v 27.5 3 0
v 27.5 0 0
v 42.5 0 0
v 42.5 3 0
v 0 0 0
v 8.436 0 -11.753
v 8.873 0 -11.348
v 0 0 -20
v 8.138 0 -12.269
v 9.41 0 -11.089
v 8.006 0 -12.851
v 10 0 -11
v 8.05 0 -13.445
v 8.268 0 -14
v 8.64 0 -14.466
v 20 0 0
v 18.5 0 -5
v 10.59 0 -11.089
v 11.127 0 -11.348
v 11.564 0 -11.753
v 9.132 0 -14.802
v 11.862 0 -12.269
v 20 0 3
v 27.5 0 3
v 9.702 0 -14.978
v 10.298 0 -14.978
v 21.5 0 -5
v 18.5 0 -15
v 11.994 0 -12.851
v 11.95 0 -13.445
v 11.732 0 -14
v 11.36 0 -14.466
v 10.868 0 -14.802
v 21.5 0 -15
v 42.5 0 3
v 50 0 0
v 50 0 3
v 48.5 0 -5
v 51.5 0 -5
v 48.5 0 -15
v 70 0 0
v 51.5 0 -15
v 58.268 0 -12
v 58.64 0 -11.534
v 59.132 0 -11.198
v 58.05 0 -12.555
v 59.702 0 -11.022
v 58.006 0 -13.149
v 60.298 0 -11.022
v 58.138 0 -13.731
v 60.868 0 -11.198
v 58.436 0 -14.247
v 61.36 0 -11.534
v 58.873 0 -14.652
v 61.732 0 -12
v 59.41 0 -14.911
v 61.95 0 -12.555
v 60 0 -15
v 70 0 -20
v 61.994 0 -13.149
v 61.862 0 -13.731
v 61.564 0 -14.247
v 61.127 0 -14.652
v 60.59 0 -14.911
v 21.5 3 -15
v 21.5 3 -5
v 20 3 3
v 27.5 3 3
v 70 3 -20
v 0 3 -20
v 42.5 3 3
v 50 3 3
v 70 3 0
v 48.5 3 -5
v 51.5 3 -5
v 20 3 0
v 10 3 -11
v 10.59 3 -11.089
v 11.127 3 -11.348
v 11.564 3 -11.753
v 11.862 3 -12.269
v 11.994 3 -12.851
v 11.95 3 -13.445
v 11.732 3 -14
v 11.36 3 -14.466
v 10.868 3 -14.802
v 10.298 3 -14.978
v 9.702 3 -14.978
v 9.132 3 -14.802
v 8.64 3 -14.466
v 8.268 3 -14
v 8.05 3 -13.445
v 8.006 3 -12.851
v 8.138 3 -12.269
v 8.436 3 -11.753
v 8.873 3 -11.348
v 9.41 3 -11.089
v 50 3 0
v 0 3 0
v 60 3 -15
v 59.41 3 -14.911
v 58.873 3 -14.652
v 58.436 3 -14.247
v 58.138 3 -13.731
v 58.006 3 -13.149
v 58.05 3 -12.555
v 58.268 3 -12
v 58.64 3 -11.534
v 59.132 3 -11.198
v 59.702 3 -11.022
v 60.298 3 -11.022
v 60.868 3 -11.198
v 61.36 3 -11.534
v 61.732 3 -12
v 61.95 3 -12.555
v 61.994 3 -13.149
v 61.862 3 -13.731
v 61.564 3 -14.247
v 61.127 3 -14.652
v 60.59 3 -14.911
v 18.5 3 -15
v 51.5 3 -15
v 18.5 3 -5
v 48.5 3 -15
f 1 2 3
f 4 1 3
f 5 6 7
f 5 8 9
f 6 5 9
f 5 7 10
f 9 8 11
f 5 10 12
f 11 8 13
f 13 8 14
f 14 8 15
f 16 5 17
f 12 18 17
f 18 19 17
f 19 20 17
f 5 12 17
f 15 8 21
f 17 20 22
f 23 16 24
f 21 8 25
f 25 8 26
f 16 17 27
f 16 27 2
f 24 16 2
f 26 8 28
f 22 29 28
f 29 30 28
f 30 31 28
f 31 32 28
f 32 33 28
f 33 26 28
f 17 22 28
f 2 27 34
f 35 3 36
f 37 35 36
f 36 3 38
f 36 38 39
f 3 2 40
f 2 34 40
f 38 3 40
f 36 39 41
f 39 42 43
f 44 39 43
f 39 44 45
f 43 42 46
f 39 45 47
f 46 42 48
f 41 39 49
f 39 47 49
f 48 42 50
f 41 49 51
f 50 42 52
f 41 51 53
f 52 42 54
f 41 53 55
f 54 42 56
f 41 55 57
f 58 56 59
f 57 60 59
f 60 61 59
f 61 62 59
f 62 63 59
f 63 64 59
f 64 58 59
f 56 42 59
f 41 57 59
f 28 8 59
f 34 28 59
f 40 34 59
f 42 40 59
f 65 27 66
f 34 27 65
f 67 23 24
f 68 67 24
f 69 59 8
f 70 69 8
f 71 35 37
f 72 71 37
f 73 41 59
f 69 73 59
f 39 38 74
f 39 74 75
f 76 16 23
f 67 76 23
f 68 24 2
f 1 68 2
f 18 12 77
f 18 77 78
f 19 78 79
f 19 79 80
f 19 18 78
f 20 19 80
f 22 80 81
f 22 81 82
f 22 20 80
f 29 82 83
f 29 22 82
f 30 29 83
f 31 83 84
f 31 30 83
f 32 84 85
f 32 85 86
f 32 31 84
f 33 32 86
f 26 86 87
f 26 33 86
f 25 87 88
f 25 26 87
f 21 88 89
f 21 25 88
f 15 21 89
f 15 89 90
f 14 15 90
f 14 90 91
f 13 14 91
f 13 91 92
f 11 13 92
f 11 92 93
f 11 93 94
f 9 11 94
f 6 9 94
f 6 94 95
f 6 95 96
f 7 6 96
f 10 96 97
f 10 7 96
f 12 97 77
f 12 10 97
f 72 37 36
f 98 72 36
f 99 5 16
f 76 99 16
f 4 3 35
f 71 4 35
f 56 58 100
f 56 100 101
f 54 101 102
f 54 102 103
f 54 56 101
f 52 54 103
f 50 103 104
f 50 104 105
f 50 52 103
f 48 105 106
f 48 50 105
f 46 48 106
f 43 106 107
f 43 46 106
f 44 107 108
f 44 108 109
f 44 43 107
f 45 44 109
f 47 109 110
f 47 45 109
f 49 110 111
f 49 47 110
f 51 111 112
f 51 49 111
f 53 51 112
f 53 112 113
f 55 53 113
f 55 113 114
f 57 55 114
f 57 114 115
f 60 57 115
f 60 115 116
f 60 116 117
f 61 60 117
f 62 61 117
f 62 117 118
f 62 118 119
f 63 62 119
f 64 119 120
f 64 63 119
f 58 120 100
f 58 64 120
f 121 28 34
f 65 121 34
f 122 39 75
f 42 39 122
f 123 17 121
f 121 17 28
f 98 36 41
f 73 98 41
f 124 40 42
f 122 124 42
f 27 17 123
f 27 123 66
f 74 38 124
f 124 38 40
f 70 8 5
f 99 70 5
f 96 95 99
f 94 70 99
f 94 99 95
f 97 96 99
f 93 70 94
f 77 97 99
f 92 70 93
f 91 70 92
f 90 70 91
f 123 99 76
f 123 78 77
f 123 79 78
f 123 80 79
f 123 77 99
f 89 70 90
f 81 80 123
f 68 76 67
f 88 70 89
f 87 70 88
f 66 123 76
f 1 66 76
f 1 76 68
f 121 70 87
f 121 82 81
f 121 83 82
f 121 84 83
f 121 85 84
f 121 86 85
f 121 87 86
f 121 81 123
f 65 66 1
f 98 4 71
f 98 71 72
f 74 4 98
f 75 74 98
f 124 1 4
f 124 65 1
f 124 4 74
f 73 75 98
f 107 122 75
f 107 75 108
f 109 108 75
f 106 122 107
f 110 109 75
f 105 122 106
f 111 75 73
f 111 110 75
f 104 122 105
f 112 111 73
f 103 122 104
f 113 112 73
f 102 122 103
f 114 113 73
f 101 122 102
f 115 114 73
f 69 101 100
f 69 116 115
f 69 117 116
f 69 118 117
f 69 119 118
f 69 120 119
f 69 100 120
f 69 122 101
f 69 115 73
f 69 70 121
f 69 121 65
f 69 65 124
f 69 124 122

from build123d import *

# Parameters (mm, degrees)
SKETCH1_R           = 2
SKETCH1_W           = 3
SKETCH1_H           = 10
BOSS_EXTRUDE1_DEPTH = 3


with BuildPart() as part:
    # Sketch1 → Boss-Extrude1 (new body)
    with BuildSketch(Plane(origin=(0, 0, 0), x_dir=(1, 0, 0), z_dir=(0, 1, 0))):
        Polygon((0, 0), (20, 0), (20, -3), (27.5, -3), (27.5, 0), (42.5, 0), (42.5, -3), (50, -3), (50, 0), (70, 0), (70, 20), (0, 20), align=None)
        with Locations(Location((10, 13, 0), (0, 0, 270))):
            Circle(SKETCH1_R, mode=Mode.SUBTRACT)
        with Locations(Location((60, 13, 0), (0, 0, 90))):
            Circle(SKETCH1_R, mode=Mode.SUBTRACT)
        with Locations((20, 10)):
            Rectangle(SKETCH1_W, SKETCH1_H, mode=Mode.SUBTRACT)
        with Locations((50, 10)):
            Rectangle(SKETCH1_W, SKETCH1_H, mode=Mode.SUBTRACT)
    extrude(amount=BOSS_EXTRUDE1_DEPTH)


solid = part.part
